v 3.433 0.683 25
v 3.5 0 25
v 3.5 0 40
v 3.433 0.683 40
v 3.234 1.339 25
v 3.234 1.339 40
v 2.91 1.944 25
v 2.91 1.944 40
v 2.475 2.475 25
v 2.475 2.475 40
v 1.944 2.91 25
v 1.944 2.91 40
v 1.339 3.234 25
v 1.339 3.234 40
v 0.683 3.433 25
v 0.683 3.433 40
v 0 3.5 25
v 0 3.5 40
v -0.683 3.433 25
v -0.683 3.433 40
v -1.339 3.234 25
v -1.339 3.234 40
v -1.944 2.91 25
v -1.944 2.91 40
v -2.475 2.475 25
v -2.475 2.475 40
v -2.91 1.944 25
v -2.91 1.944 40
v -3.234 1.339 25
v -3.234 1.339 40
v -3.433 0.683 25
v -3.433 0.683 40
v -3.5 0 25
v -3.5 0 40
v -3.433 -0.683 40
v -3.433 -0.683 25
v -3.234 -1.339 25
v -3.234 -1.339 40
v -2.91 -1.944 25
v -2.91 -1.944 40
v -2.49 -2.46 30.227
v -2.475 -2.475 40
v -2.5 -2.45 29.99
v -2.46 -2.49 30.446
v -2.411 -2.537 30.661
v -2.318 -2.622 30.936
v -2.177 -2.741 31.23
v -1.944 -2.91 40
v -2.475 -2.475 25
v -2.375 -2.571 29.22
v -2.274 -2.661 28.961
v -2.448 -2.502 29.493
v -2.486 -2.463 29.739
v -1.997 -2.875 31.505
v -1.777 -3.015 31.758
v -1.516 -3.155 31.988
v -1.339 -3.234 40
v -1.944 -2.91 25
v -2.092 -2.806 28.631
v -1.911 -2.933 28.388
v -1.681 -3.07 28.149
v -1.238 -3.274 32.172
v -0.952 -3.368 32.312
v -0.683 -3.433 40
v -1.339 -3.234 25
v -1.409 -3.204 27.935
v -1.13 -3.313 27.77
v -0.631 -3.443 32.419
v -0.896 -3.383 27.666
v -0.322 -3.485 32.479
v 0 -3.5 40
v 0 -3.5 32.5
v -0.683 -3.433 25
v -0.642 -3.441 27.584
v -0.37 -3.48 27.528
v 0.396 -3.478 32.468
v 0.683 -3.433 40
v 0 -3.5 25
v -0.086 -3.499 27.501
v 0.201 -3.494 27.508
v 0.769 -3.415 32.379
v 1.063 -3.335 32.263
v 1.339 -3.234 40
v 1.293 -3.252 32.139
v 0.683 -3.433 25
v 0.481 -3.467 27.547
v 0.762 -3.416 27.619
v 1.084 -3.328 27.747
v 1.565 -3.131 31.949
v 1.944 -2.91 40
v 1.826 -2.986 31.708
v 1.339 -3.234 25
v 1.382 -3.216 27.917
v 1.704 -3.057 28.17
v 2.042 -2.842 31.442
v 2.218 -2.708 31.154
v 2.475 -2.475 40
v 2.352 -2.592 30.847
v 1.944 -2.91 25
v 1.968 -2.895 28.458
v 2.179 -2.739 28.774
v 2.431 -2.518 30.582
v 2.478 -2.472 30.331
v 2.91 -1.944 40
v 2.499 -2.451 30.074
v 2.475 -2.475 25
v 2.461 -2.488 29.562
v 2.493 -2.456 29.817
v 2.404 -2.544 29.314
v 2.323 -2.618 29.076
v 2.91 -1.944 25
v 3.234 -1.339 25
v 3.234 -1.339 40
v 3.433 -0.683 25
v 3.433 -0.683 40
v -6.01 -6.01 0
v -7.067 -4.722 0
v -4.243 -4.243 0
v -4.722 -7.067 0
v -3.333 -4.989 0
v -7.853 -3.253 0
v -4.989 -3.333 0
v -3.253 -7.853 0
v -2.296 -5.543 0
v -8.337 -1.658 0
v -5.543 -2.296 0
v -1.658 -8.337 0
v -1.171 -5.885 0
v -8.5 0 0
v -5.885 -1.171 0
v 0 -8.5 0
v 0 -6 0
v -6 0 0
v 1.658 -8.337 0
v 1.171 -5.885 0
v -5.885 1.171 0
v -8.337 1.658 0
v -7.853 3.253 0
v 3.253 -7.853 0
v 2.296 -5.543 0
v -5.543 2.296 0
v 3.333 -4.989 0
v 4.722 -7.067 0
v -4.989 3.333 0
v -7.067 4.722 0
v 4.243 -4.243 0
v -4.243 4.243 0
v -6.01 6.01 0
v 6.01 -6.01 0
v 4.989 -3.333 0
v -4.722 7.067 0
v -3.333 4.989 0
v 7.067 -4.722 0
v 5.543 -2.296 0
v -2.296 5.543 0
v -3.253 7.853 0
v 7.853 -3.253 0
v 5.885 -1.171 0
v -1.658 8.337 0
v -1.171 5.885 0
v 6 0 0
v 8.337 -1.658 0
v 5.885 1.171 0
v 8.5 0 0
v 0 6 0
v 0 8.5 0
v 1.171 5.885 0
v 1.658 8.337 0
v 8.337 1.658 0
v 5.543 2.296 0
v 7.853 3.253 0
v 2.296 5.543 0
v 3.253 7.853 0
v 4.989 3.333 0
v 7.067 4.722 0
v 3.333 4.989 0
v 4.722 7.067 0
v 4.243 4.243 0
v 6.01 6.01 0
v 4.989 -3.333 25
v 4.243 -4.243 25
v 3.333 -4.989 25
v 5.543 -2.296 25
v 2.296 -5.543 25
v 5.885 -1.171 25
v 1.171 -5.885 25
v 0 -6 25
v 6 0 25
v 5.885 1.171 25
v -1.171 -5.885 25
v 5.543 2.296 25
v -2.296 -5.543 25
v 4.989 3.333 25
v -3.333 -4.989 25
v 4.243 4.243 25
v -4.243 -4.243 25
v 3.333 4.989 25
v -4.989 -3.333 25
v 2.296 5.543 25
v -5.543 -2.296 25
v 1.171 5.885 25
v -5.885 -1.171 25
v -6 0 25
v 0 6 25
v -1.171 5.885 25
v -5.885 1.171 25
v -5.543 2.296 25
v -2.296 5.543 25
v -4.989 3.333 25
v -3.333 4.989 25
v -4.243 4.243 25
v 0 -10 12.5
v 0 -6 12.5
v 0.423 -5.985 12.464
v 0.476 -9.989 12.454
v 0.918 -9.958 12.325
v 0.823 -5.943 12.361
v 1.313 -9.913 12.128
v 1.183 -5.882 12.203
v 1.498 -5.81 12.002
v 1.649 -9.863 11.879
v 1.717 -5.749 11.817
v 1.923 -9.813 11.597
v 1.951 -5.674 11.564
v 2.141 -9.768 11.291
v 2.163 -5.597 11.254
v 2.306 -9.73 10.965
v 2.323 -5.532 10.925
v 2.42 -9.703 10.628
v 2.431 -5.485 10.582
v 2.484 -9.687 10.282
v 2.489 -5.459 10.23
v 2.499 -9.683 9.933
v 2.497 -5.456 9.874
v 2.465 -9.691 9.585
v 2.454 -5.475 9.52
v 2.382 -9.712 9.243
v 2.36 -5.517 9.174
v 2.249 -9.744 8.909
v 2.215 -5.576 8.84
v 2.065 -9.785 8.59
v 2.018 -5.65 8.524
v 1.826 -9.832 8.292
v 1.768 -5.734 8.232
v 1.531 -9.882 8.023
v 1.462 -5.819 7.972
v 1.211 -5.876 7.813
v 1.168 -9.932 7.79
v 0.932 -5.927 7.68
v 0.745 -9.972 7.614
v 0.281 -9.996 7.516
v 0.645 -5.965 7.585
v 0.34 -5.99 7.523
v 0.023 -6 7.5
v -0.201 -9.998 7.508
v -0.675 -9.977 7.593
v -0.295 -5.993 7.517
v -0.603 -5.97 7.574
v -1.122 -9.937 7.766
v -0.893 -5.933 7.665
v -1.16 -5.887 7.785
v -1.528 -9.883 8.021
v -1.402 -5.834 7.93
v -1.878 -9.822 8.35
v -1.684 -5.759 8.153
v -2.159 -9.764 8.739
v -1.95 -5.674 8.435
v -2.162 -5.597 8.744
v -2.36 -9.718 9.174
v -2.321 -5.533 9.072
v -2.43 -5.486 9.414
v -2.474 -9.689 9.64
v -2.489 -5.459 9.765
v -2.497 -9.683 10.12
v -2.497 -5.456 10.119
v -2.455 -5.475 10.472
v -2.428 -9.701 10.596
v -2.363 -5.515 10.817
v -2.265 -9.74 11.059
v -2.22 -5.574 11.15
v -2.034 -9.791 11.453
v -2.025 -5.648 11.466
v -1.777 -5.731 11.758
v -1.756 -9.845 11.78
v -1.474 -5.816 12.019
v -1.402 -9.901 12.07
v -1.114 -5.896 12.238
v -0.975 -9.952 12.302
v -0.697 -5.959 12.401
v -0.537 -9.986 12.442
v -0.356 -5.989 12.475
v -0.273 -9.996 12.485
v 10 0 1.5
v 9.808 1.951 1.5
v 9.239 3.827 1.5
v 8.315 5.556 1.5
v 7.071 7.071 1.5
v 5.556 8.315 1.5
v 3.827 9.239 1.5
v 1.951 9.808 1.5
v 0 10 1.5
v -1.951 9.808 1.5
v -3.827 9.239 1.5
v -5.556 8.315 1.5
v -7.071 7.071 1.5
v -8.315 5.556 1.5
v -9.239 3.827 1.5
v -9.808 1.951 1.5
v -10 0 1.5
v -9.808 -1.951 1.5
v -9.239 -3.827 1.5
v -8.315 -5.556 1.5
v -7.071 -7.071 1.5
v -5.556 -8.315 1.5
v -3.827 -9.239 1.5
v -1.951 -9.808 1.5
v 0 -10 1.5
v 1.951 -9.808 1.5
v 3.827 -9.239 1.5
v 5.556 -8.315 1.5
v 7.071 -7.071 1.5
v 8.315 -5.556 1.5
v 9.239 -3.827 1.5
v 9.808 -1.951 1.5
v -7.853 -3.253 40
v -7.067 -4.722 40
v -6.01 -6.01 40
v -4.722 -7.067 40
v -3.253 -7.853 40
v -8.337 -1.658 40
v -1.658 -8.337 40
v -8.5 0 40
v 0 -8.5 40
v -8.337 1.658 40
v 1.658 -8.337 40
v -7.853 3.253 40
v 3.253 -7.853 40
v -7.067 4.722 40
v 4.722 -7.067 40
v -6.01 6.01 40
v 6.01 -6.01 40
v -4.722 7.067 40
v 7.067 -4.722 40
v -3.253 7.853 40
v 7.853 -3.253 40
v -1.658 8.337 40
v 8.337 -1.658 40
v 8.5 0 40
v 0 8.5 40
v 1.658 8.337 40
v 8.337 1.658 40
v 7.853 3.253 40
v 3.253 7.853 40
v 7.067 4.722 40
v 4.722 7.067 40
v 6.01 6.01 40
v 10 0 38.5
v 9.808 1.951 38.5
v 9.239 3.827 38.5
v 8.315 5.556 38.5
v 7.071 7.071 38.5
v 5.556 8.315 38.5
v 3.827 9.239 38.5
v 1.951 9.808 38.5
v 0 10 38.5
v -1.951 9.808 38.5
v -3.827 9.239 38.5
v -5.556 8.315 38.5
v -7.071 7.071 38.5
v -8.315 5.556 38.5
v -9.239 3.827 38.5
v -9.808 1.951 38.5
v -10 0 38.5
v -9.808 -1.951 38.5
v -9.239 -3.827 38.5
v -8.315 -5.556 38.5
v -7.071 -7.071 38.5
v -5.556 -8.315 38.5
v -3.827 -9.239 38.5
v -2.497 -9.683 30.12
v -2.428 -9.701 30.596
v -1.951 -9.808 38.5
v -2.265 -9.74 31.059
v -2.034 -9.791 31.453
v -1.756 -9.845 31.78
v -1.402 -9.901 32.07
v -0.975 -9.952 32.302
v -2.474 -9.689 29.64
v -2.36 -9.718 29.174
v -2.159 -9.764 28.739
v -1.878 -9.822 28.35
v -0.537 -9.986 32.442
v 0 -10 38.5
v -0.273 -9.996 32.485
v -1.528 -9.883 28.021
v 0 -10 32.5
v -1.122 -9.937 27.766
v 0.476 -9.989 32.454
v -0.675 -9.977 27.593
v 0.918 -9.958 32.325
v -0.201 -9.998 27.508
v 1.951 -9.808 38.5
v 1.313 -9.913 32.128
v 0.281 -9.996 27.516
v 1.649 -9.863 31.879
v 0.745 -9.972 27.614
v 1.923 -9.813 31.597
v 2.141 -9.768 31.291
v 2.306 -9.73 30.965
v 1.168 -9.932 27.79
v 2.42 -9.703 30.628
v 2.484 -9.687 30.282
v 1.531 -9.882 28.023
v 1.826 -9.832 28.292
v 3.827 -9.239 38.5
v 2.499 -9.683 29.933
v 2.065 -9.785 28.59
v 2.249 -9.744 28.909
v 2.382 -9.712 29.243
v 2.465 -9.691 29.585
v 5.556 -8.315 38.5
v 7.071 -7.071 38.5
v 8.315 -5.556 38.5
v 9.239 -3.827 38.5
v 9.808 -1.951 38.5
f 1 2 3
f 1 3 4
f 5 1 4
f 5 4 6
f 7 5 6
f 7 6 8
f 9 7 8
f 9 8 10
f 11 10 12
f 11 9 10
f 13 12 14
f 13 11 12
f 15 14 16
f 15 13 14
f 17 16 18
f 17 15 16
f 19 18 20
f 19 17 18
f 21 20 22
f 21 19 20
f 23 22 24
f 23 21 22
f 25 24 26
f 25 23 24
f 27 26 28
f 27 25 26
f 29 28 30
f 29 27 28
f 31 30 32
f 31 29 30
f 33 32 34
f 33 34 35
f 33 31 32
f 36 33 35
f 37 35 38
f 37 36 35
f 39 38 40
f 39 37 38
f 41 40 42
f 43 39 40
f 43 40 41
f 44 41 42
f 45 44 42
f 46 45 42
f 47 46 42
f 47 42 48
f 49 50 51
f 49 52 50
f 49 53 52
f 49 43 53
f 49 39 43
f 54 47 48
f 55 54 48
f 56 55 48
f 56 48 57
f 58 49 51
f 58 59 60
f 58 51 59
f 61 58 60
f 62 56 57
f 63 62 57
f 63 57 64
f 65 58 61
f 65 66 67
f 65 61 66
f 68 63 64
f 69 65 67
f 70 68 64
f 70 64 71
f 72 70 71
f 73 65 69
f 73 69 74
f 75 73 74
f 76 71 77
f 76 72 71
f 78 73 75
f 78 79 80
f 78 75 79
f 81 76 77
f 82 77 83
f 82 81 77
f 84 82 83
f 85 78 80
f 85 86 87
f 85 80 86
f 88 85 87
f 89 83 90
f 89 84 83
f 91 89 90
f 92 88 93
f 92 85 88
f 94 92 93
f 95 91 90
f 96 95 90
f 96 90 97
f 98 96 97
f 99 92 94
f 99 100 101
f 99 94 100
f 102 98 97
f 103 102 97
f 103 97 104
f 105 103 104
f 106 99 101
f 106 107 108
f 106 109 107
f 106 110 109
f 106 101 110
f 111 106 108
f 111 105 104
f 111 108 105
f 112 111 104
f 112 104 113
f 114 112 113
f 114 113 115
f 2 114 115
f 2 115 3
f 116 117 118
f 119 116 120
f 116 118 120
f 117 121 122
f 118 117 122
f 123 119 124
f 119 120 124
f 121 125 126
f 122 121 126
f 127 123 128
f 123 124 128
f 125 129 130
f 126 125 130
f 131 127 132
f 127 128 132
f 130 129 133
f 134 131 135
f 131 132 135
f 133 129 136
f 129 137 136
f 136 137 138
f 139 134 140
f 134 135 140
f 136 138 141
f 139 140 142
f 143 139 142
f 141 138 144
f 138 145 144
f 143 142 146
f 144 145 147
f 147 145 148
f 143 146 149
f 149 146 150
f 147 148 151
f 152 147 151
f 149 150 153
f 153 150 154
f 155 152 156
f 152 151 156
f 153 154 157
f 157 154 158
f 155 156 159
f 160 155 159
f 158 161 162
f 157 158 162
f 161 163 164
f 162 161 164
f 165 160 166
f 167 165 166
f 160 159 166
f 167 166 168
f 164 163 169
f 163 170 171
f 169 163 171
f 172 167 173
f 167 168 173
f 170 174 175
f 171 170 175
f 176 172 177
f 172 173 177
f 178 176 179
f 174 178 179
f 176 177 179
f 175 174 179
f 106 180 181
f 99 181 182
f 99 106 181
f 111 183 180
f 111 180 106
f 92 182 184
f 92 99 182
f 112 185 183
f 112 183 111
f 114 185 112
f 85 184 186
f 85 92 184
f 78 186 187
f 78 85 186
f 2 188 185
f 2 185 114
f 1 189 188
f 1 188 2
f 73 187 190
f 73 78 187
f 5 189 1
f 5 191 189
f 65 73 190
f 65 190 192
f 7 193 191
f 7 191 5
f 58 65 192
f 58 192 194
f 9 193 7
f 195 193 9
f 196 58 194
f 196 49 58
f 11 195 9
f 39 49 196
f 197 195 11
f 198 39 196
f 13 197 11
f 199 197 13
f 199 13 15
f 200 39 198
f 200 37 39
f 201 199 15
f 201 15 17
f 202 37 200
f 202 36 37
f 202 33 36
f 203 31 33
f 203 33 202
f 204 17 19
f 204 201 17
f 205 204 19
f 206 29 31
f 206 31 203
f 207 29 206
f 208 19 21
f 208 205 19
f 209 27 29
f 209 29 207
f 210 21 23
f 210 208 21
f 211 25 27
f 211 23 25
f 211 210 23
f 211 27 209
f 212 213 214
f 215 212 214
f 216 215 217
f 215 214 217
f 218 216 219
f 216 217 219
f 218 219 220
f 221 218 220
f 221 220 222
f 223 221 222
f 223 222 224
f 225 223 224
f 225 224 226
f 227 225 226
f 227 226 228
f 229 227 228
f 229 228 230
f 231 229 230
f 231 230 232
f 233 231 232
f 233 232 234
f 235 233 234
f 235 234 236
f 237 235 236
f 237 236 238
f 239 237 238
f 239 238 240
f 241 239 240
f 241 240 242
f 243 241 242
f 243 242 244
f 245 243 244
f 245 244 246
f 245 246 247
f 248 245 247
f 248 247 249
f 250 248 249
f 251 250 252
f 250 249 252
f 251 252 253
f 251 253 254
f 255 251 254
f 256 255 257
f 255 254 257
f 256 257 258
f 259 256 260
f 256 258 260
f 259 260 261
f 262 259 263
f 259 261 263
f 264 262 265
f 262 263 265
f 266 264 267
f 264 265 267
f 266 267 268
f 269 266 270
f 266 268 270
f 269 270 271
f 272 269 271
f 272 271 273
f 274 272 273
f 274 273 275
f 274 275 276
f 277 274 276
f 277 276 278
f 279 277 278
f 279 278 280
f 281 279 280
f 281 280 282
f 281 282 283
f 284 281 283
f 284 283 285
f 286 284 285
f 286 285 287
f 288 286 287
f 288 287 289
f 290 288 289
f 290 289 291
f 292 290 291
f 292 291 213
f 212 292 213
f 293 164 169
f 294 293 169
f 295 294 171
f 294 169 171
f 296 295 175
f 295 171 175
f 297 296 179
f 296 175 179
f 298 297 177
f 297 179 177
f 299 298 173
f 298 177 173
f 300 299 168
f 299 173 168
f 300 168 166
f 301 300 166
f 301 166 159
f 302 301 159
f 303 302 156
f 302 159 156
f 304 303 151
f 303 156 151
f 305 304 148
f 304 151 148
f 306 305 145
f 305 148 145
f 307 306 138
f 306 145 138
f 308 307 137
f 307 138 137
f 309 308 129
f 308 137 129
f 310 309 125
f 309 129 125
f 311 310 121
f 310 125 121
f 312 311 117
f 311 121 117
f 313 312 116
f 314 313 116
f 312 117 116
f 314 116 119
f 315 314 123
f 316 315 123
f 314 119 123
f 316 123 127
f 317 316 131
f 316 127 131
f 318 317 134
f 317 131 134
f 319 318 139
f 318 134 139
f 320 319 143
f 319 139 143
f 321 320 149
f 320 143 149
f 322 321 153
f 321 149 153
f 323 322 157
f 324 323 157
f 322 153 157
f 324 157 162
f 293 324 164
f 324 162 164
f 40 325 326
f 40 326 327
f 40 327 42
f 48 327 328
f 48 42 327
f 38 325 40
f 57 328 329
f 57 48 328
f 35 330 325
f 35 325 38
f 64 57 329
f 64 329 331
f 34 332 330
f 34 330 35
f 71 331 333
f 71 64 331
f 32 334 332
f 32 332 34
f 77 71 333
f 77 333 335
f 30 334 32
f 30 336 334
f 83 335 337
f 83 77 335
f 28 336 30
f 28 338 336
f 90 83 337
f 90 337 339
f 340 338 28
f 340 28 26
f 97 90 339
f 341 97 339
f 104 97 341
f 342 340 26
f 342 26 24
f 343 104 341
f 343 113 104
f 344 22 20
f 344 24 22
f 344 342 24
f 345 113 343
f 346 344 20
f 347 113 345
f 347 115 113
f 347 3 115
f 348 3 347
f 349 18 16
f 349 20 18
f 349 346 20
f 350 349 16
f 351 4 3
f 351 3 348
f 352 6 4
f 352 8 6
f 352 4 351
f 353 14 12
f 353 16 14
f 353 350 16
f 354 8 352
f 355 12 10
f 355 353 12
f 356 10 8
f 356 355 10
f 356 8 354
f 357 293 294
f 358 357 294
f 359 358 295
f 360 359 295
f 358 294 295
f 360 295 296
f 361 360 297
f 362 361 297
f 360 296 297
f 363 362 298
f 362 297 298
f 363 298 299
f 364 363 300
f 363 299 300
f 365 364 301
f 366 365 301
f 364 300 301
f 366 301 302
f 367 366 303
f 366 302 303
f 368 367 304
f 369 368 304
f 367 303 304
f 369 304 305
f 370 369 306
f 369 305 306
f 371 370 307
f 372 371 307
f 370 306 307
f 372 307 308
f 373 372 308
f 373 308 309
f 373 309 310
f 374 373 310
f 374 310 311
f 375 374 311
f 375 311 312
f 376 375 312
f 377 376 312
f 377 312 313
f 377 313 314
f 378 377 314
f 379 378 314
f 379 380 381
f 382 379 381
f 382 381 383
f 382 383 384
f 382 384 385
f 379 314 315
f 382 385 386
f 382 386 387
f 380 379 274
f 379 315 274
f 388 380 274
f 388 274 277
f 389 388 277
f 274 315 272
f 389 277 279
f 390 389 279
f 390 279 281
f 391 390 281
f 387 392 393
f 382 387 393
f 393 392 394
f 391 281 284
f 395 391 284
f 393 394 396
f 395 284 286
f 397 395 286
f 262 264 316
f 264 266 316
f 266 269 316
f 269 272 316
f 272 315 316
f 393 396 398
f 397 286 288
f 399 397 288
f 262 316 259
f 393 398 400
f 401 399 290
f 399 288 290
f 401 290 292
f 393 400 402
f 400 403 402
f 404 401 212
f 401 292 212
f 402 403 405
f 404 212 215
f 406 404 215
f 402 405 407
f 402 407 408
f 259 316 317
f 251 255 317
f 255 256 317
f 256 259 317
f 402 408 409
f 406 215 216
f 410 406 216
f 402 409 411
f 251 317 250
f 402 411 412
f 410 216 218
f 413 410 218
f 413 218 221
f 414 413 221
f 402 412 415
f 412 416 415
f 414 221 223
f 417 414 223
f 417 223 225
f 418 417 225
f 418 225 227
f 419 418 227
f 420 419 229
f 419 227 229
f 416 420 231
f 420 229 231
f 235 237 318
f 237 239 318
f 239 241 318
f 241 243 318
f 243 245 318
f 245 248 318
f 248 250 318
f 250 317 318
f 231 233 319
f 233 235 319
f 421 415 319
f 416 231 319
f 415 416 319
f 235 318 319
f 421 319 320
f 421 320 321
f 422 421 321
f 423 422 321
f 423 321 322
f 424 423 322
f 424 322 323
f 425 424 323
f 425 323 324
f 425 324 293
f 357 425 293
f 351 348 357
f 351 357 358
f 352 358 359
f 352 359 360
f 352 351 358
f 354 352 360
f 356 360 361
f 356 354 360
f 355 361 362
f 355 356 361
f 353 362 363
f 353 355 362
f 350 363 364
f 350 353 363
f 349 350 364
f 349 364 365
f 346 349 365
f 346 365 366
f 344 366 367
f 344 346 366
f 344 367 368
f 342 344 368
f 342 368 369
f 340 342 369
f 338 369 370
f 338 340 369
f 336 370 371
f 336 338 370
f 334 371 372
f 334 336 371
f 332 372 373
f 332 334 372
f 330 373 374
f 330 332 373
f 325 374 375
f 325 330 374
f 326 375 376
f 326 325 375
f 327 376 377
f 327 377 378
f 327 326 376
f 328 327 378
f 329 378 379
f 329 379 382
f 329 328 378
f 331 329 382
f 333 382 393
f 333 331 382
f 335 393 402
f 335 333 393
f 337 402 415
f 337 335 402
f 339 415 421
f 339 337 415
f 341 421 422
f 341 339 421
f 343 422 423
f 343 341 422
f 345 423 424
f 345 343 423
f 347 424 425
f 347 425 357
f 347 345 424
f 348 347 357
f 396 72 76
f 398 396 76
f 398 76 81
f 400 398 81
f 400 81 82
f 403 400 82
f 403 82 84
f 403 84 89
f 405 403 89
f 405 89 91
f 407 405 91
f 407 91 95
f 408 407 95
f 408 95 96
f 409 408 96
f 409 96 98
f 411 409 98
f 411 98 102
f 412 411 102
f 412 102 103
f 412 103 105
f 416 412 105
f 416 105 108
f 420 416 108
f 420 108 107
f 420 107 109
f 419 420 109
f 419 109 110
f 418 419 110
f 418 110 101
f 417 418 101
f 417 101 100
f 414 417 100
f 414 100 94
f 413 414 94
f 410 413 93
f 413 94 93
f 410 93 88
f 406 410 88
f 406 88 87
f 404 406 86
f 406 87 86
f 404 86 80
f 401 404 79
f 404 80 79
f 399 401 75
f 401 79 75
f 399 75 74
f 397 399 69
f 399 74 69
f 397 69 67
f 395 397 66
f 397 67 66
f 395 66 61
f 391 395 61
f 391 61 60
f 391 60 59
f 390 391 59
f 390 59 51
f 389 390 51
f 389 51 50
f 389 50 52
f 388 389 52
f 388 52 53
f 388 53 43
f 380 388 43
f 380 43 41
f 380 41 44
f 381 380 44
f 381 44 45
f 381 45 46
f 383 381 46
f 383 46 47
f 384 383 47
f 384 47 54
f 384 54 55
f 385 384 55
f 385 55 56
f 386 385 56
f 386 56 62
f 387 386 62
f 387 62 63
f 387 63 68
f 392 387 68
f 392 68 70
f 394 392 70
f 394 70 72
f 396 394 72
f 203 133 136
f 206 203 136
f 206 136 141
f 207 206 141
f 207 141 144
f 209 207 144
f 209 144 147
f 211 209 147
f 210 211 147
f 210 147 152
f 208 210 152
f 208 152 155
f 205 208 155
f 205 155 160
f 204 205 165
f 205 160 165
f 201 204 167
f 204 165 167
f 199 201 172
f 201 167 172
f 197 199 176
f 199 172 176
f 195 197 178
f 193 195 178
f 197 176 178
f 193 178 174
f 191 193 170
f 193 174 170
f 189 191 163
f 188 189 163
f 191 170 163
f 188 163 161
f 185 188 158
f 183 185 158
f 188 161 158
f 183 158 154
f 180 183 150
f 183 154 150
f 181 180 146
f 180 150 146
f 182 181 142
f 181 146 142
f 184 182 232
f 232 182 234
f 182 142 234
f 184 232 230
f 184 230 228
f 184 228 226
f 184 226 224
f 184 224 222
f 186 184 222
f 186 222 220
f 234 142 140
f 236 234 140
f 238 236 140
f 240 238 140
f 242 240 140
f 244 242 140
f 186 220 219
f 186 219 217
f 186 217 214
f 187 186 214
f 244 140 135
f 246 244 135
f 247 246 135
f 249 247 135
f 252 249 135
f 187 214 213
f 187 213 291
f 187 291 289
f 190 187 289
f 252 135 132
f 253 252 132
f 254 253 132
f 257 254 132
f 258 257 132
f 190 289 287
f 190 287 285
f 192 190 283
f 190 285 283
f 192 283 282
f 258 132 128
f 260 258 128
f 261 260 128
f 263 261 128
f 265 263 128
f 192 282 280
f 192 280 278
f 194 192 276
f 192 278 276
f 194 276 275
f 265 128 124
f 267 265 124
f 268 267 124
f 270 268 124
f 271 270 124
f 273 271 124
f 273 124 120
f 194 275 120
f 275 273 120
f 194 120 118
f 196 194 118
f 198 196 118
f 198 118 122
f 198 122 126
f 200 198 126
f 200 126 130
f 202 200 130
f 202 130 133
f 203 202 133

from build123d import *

# Parameters (mm, degrees)
SKETCH1_R           = 10
SKETCH1_R_2         = 3.5
BOSS_EXTRUDE1_DEPTH = 40
CHAMFER1_SIZE       = 1.5
SKETCH2_R           = 6
CUT_EXTRUDE1_DEPTH  = 25
SKETCH3_R           = 2.5
CUT_EXTRUDE2_DEPTH  = 20


with BuildPart() as part:
    # Sketch1 → Boss-Extrude1 (new body)
    with BuildSketch(Plane.XY):
        Circle(SKETCH1_R)
        Circle(SKETCH1_R_2, mode=Mode.SUBTRACT)
    extrude(amount=BOSS_EXTRUDE1_DEPTH)

    # Chamfer1
    chamfer1_edges = [part.edges().sort_by_distance(p)[0] for p in [
        (-10, 0, 0),
        (-10, 0, 40),
    ]]
    chamfer(chamfer1_edges, length=CHAMFER1_SIZE)

    # Sketch2 → Cut-Extrude1 (cut)
    with BuildSketch(Plane(origin=(0, 0, 0), x_dir=(-1, 0, 0), z_dir=(0, 0, -1))):
        Circle(SKETCH2_R)
    extrude(amount=-CUT_EXTRUDE1_DEPTH, mode=Mode.SUBTRACT)

    # Sketch3 → Cut-Extrude2 (cut)
    with BuildSketch(Plane(origin=(0, 0, 0), x_dir=(1, 0, 0), z_dir=(0, 1, 0))):
        with Locations(Location((0, -10, 0), (0, 0, 270))):
            Circle(SKETCH3_R)
        with Locations(Location((0, -30, 0), (0, 0, 270))):
            Circle(SKETCH3_R)
    extrude(amount=-CUT_EXTRUDE2_DEPTH, mode=Mode.SUBTRACT)


solid = part.part
